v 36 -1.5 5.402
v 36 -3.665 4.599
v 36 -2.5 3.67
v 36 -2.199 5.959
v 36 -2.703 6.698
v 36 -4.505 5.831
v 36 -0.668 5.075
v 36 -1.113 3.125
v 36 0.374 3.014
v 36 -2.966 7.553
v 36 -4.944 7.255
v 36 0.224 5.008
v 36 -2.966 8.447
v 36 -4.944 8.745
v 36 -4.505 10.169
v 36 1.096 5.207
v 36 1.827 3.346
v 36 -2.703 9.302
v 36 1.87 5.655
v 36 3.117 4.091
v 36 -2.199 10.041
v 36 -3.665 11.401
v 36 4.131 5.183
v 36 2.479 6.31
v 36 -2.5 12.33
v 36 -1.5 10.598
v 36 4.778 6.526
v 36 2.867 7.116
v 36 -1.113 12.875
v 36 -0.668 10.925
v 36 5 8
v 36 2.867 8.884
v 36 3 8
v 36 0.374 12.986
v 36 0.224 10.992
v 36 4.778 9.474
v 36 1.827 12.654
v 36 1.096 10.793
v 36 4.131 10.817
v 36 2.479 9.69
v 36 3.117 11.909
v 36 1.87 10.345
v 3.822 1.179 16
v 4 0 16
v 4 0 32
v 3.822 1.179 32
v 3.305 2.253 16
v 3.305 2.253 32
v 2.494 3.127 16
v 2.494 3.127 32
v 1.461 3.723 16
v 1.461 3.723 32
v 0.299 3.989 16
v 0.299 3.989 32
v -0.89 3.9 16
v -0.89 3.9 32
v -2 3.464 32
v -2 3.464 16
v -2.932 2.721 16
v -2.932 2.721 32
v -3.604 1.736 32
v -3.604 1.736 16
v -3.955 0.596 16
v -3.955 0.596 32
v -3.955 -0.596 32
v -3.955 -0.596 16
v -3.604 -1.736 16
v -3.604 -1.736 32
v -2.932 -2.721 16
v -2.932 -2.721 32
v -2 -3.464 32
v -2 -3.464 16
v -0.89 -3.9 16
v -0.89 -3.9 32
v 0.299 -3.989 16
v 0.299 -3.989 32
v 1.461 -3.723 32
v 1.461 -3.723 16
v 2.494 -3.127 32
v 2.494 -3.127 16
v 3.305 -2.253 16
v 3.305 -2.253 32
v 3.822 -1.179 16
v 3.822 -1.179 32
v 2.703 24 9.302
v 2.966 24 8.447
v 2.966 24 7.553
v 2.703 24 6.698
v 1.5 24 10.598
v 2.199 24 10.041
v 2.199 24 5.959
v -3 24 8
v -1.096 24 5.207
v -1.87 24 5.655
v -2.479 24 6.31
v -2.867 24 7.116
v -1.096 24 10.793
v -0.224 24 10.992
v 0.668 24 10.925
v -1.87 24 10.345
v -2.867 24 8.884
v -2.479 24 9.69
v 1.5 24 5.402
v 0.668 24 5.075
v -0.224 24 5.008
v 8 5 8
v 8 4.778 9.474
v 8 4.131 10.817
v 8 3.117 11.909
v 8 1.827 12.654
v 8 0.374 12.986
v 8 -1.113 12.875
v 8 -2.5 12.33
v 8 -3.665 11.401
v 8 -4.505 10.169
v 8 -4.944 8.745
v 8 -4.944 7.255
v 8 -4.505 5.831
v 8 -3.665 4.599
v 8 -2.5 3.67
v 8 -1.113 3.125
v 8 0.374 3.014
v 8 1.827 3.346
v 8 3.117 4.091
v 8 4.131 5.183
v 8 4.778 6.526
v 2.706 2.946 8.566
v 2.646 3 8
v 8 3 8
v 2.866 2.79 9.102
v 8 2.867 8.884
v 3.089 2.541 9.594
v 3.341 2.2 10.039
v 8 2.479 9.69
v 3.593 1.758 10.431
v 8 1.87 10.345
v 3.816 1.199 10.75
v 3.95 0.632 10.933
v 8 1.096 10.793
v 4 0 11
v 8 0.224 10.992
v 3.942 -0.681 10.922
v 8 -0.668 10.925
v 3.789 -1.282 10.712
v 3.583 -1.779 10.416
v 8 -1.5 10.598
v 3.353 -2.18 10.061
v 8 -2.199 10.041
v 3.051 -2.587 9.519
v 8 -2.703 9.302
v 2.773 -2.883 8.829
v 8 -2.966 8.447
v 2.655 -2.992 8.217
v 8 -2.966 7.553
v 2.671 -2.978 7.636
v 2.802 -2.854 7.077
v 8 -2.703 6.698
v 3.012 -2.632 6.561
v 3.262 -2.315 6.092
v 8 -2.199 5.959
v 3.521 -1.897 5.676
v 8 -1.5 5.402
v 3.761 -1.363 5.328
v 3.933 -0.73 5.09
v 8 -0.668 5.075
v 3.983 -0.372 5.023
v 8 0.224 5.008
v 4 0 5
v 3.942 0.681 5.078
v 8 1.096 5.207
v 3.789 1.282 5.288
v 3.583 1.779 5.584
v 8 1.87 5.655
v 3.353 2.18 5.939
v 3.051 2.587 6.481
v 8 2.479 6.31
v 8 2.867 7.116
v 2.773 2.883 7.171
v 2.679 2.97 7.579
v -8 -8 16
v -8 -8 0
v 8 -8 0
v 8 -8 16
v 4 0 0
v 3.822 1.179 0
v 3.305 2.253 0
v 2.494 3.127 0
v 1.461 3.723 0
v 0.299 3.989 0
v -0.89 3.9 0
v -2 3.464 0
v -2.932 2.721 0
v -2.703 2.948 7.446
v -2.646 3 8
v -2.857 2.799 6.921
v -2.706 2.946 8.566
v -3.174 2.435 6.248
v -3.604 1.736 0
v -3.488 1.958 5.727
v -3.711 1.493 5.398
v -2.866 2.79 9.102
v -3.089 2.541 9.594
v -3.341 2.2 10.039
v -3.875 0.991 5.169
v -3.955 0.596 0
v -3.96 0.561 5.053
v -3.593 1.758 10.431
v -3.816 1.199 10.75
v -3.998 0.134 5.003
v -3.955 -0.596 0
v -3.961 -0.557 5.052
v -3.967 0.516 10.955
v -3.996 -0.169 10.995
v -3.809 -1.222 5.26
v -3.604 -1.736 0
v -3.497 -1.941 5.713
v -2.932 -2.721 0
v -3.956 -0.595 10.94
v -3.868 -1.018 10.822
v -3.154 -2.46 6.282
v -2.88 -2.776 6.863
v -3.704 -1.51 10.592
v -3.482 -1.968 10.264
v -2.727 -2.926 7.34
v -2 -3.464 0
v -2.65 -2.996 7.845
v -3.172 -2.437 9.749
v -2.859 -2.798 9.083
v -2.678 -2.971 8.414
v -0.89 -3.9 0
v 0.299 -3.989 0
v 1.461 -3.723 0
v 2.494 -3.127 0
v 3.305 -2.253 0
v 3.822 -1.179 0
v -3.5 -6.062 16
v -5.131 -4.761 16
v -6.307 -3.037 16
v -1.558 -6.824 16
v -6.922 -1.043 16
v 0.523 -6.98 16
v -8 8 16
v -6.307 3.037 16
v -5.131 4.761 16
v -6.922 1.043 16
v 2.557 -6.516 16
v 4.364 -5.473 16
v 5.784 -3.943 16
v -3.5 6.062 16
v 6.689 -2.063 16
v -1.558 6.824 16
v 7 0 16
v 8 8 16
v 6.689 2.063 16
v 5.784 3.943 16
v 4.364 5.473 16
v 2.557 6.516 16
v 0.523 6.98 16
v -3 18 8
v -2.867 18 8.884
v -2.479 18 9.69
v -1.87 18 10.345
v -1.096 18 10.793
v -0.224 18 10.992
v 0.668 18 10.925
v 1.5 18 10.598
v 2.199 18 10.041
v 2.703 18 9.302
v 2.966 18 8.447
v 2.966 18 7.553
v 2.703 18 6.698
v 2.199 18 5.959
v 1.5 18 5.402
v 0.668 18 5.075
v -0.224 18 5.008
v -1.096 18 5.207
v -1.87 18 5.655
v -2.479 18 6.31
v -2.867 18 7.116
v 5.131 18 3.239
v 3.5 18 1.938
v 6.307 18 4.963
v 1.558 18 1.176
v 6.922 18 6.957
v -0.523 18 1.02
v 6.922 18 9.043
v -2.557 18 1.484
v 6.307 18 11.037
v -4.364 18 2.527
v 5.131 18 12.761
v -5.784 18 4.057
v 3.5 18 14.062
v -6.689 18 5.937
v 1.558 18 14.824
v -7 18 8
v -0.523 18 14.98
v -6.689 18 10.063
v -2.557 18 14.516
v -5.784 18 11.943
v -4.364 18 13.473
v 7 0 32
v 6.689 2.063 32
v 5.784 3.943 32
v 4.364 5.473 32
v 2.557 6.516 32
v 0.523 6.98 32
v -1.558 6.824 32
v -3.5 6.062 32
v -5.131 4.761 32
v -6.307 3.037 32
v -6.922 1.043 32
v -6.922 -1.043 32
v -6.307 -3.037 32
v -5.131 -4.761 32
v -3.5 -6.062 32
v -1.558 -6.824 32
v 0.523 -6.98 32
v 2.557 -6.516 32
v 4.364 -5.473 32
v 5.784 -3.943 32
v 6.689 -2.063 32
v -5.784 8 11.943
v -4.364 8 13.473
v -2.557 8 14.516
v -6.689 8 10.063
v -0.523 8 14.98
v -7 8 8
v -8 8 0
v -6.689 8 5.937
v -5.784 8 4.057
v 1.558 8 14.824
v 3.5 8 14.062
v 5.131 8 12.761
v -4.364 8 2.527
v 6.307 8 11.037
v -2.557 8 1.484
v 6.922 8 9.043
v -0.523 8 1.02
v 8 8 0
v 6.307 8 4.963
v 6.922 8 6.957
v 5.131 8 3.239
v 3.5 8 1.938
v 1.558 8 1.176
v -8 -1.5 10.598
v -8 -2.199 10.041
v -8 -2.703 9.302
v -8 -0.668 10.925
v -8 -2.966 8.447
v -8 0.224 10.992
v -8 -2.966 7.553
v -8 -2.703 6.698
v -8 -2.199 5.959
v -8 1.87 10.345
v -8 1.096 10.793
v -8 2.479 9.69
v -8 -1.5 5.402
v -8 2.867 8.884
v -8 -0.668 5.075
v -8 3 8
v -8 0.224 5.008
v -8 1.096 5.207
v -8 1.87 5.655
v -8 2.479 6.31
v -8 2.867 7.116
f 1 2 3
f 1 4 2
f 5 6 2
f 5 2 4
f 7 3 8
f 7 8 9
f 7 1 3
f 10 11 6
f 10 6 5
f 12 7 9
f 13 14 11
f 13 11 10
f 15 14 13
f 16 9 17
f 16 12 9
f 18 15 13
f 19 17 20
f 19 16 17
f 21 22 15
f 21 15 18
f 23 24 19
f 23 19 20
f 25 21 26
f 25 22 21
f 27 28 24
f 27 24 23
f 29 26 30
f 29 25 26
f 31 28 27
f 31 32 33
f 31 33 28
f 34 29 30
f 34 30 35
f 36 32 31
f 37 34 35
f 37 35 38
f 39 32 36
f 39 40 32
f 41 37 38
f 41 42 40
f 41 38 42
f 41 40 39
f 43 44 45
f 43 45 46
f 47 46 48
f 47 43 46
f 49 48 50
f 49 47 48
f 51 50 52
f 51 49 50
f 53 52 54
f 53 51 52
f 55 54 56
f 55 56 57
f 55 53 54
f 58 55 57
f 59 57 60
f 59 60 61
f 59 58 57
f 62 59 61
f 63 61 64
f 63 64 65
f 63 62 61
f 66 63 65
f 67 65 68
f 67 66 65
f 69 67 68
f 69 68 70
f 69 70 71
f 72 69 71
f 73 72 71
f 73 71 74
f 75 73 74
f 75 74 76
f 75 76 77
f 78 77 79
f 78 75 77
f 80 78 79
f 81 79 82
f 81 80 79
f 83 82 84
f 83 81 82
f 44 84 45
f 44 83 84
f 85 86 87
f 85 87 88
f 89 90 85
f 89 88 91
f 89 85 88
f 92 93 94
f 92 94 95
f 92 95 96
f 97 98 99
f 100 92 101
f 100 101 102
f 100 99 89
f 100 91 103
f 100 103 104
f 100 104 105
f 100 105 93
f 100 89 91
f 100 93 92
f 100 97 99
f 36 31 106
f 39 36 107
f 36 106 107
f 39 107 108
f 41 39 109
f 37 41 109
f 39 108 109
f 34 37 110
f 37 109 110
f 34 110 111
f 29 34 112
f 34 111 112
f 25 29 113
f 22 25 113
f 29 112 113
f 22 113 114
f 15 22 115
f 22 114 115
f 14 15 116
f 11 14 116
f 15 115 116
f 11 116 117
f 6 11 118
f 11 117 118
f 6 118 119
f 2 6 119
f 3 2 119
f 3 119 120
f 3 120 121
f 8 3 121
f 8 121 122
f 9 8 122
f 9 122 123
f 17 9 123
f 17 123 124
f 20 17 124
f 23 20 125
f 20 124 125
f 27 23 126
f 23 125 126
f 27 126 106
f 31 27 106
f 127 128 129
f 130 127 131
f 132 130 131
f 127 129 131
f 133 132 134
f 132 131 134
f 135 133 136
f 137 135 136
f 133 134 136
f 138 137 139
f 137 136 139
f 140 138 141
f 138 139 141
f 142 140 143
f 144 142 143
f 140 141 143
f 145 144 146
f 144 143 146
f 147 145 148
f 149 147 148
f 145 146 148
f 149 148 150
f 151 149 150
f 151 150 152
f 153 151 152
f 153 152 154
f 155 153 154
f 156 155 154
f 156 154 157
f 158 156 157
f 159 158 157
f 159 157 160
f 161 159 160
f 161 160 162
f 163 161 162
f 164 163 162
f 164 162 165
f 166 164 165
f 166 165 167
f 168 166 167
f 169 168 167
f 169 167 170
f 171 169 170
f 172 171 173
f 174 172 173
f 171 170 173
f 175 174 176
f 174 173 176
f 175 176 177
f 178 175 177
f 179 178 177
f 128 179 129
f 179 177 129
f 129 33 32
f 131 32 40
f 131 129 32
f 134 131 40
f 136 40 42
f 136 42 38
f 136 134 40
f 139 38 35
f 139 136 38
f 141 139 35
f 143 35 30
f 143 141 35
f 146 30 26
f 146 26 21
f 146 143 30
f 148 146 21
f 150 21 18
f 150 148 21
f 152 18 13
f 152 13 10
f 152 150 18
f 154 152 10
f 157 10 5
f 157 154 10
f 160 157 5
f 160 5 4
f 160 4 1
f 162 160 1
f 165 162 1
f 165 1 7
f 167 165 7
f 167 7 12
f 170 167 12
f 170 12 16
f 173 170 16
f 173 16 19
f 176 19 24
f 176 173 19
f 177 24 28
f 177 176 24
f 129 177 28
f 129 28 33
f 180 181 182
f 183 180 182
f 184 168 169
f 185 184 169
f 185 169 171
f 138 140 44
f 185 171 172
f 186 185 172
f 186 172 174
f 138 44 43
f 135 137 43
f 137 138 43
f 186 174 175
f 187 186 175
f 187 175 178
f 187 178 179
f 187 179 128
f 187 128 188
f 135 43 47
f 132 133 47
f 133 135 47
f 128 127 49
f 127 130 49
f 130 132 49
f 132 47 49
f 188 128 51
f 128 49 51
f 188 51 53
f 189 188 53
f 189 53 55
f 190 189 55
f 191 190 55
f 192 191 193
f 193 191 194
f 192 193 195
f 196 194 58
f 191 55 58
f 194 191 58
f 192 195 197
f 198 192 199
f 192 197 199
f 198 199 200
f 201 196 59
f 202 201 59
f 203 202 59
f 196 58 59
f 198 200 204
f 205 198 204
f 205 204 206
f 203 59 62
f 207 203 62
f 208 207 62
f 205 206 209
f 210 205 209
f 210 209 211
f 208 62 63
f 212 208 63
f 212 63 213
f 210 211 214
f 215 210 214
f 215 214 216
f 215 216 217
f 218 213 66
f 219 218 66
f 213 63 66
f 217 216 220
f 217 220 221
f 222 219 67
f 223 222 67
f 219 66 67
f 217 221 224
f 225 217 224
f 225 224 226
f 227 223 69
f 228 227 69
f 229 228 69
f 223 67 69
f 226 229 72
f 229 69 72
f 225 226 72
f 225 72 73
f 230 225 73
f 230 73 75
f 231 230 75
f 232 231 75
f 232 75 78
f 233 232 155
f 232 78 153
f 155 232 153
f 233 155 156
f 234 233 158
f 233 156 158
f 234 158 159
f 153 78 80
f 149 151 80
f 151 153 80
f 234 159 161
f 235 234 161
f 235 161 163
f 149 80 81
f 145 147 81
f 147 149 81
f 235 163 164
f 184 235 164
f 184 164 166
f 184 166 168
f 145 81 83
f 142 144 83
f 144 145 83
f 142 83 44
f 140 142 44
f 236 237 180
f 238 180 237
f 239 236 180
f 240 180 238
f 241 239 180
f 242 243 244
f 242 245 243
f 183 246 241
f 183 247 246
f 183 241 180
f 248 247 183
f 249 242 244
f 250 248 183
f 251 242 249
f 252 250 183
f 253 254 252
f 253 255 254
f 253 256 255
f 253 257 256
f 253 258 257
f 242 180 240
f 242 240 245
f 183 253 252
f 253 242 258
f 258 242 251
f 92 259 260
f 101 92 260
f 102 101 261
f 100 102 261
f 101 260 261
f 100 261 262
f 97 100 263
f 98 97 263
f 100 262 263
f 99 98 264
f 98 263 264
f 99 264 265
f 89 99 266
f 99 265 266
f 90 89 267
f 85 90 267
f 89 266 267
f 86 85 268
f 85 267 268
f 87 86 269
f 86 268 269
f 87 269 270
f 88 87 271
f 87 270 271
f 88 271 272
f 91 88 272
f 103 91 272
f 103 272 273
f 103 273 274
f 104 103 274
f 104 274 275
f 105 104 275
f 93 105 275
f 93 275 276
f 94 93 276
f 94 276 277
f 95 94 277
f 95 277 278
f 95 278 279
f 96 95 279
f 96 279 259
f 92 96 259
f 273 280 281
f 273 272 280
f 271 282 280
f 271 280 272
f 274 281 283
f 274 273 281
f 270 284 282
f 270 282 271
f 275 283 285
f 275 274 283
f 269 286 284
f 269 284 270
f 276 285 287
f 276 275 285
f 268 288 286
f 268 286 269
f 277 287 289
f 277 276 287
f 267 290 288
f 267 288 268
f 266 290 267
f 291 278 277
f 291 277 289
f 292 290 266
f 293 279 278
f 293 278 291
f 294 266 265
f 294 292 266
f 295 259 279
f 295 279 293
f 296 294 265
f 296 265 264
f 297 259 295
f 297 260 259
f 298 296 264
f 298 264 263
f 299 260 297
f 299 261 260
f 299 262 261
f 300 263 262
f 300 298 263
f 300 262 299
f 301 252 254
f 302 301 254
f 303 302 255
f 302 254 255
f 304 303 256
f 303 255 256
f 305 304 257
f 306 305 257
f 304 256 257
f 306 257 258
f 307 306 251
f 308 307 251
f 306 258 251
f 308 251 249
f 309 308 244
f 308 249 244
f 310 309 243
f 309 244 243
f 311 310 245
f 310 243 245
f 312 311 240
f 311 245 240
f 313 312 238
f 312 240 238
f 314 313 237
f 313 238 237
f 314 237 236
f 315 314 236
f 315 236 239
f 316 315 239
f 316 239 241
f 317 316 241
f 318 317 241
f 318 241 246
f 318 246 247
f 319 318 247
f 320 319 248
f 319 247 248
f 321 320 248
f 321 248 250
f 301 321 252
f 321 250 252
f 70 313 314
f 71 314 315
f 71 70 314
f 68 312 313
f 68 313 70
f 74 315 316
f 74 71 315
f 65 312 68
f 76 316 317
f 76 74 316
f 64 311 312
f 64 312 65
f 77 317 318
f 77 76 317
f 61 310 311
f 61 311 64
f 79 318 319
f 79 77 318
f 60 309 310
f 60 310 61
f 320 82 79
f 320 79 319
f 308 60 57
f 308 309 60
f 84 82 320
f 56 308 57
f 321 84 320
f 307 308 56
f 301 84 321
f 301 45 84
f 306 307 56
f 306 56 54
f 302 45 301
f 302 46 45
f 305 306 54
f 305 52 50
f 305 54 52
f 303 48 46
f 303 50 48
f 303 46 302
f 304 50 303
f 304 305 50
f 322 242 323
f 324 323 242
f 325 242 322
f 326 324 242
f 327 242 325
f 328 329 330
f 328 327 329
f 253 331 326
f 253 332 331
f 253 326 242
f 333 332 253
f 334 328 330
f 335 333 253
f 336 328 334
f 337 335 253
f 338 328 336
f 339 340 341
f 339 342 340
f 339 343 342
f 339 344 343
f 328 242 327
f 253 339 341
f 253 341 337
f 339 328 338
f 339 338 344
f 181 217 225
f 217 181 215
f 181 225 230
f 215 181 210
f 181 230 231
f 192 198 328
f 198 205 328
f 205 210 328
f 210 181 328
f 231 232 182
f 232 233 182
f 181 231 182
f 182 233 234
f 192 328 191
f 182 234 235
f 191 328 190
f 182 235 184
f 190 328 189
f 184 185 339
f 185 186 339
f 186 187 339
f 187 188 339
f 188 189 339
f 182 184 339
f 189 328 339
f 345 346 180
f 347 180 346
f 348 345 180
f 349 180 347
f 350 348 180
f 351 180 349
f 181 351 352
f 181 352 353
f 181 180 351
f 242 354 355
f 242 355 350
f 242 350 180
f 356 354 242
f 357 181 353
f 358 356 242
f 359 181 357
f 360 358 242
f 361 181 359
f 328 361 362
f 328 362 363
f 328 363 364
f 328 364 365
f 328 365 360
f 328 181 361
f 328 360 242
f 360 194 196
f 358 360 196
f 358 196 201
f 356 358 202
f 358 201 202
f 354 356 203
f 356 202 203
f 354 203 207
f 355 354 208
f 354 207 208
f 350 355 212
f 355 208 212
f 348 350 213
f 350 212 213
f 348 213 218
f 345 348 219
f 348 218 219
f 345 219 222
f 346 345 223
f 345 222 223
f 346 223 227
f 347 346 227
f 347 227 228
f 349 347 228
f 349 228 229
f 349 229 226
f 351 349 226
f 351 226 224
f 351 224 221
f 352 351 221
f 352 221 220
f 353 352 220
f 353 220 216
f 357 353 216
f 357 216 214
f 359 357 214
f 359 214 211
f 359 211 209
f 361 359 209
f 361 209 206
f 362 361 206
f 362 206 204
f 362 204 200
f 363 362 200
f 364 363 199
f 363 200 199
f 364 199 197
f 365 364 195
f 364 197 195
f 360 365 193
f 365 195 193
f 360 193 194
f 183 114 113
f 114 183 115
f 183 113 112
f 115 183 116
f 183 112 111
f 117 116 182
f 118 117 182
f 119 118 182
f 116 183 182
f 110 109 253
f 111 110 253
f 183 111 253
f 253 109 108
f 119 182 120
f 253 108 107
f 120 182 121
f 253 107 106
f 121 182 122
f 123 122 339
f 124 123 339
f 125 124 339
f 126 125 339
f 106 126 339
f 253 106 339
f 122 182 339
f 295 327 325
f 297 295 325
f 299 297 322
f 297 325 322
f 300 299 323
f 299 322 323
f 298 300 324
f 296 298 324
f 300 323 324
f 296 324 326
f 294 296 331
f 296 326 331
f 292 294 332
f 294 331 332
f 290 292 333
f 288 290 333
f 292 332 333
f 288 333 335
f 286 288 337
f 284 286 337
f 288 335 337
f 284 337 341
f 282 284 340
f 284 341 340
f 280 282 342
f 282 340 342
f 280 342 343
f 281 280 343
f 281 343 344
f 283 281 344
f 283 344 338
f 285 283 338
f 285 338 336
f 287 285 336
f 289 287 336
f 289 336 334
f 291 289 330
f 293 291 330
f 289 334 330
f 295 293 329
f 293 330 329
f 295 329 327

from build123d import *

# Parameters (mm, degrees)
F0_W      = 16
F0_H      = 16
F1_DEPTH  = 16
F2_R      = 3
F3_DEPTH  = 25
F2_R_2    = 5
F4_DEPTH  = 28
F5_R      = 4
F6_DEPTH  = 25
F5_R_2    = 7
F7_DEPTH  = 16
F8_R      = 3
F9_DEPTH  = 16
F8_R_2    = 7
F10_DEPTH = 10


with BuildPart() as f1:
    # F0 (on Top) → F1 (new body)
    with BuildSketch(Plane.XY):
        Rectangle(F0_W, F0_H)
    extrude(amount=F1_DEPTH)

    # F2 (on face) → F3 (cut)
    with BuildSketch(Plane.YZ.offset(8)):
        with Locations((0, 8)):
            Circle(F2_R)
    extrude(amount=-F3_DEPTH, mode=Mode.SUBTRACT)

    # F2 (on face) → F4 (join)
    with BuildSketch(Plane.YZ.offset(8)):
        with Locations((0, 8)):
            Circle(F2_R_2)
        with Locations((0, 8)):
            Circle(F2_R, mode=Mode.SUBTRACT)
    extrude(amount=F4_DEPTH)

    # F5 (on face) → F6 (cut)
    with BuildSketch(Plane.XY.offset(16)):
        Circle(F5_R)
    extrude(amount=-F6_DEPTH, mode=Mode.SUBTRACT)

    # F5 (on face) → F7 (join)
    with BuildSketch(Plane.XY.offset(16)):
        Circle(F5_R_2)
        Circle(F5_R, mode=Mode.SUBTRACT)
    extrude(amount=F7_DEPTH)

    # F8 (on face) → F9 (join)
    with BuildSketch(Plane(origin=(0, 8, 0), x_dir=(-1, 0, 0), z_dir=(0, 1, 0))):
        with Locations((0, 8)):
            Circle(F8_R)
    extrude(amount=F9_DEPTH)

    # F8 (on face) → F10 (join)
    with BuildSketch(Plane(origin=(0, 8, 0), x_dir=(-1, 0, 0), z_dir=(0, 1, 0))):
        with Locations((0, 8)):
            Circle(F8_R_2)
        with Locations((0, 8)):
            Circle(F8_R, mode=Mode.SUBTRACT)
    extrude(amount=F10_DEPTH)


solid = f1.part
